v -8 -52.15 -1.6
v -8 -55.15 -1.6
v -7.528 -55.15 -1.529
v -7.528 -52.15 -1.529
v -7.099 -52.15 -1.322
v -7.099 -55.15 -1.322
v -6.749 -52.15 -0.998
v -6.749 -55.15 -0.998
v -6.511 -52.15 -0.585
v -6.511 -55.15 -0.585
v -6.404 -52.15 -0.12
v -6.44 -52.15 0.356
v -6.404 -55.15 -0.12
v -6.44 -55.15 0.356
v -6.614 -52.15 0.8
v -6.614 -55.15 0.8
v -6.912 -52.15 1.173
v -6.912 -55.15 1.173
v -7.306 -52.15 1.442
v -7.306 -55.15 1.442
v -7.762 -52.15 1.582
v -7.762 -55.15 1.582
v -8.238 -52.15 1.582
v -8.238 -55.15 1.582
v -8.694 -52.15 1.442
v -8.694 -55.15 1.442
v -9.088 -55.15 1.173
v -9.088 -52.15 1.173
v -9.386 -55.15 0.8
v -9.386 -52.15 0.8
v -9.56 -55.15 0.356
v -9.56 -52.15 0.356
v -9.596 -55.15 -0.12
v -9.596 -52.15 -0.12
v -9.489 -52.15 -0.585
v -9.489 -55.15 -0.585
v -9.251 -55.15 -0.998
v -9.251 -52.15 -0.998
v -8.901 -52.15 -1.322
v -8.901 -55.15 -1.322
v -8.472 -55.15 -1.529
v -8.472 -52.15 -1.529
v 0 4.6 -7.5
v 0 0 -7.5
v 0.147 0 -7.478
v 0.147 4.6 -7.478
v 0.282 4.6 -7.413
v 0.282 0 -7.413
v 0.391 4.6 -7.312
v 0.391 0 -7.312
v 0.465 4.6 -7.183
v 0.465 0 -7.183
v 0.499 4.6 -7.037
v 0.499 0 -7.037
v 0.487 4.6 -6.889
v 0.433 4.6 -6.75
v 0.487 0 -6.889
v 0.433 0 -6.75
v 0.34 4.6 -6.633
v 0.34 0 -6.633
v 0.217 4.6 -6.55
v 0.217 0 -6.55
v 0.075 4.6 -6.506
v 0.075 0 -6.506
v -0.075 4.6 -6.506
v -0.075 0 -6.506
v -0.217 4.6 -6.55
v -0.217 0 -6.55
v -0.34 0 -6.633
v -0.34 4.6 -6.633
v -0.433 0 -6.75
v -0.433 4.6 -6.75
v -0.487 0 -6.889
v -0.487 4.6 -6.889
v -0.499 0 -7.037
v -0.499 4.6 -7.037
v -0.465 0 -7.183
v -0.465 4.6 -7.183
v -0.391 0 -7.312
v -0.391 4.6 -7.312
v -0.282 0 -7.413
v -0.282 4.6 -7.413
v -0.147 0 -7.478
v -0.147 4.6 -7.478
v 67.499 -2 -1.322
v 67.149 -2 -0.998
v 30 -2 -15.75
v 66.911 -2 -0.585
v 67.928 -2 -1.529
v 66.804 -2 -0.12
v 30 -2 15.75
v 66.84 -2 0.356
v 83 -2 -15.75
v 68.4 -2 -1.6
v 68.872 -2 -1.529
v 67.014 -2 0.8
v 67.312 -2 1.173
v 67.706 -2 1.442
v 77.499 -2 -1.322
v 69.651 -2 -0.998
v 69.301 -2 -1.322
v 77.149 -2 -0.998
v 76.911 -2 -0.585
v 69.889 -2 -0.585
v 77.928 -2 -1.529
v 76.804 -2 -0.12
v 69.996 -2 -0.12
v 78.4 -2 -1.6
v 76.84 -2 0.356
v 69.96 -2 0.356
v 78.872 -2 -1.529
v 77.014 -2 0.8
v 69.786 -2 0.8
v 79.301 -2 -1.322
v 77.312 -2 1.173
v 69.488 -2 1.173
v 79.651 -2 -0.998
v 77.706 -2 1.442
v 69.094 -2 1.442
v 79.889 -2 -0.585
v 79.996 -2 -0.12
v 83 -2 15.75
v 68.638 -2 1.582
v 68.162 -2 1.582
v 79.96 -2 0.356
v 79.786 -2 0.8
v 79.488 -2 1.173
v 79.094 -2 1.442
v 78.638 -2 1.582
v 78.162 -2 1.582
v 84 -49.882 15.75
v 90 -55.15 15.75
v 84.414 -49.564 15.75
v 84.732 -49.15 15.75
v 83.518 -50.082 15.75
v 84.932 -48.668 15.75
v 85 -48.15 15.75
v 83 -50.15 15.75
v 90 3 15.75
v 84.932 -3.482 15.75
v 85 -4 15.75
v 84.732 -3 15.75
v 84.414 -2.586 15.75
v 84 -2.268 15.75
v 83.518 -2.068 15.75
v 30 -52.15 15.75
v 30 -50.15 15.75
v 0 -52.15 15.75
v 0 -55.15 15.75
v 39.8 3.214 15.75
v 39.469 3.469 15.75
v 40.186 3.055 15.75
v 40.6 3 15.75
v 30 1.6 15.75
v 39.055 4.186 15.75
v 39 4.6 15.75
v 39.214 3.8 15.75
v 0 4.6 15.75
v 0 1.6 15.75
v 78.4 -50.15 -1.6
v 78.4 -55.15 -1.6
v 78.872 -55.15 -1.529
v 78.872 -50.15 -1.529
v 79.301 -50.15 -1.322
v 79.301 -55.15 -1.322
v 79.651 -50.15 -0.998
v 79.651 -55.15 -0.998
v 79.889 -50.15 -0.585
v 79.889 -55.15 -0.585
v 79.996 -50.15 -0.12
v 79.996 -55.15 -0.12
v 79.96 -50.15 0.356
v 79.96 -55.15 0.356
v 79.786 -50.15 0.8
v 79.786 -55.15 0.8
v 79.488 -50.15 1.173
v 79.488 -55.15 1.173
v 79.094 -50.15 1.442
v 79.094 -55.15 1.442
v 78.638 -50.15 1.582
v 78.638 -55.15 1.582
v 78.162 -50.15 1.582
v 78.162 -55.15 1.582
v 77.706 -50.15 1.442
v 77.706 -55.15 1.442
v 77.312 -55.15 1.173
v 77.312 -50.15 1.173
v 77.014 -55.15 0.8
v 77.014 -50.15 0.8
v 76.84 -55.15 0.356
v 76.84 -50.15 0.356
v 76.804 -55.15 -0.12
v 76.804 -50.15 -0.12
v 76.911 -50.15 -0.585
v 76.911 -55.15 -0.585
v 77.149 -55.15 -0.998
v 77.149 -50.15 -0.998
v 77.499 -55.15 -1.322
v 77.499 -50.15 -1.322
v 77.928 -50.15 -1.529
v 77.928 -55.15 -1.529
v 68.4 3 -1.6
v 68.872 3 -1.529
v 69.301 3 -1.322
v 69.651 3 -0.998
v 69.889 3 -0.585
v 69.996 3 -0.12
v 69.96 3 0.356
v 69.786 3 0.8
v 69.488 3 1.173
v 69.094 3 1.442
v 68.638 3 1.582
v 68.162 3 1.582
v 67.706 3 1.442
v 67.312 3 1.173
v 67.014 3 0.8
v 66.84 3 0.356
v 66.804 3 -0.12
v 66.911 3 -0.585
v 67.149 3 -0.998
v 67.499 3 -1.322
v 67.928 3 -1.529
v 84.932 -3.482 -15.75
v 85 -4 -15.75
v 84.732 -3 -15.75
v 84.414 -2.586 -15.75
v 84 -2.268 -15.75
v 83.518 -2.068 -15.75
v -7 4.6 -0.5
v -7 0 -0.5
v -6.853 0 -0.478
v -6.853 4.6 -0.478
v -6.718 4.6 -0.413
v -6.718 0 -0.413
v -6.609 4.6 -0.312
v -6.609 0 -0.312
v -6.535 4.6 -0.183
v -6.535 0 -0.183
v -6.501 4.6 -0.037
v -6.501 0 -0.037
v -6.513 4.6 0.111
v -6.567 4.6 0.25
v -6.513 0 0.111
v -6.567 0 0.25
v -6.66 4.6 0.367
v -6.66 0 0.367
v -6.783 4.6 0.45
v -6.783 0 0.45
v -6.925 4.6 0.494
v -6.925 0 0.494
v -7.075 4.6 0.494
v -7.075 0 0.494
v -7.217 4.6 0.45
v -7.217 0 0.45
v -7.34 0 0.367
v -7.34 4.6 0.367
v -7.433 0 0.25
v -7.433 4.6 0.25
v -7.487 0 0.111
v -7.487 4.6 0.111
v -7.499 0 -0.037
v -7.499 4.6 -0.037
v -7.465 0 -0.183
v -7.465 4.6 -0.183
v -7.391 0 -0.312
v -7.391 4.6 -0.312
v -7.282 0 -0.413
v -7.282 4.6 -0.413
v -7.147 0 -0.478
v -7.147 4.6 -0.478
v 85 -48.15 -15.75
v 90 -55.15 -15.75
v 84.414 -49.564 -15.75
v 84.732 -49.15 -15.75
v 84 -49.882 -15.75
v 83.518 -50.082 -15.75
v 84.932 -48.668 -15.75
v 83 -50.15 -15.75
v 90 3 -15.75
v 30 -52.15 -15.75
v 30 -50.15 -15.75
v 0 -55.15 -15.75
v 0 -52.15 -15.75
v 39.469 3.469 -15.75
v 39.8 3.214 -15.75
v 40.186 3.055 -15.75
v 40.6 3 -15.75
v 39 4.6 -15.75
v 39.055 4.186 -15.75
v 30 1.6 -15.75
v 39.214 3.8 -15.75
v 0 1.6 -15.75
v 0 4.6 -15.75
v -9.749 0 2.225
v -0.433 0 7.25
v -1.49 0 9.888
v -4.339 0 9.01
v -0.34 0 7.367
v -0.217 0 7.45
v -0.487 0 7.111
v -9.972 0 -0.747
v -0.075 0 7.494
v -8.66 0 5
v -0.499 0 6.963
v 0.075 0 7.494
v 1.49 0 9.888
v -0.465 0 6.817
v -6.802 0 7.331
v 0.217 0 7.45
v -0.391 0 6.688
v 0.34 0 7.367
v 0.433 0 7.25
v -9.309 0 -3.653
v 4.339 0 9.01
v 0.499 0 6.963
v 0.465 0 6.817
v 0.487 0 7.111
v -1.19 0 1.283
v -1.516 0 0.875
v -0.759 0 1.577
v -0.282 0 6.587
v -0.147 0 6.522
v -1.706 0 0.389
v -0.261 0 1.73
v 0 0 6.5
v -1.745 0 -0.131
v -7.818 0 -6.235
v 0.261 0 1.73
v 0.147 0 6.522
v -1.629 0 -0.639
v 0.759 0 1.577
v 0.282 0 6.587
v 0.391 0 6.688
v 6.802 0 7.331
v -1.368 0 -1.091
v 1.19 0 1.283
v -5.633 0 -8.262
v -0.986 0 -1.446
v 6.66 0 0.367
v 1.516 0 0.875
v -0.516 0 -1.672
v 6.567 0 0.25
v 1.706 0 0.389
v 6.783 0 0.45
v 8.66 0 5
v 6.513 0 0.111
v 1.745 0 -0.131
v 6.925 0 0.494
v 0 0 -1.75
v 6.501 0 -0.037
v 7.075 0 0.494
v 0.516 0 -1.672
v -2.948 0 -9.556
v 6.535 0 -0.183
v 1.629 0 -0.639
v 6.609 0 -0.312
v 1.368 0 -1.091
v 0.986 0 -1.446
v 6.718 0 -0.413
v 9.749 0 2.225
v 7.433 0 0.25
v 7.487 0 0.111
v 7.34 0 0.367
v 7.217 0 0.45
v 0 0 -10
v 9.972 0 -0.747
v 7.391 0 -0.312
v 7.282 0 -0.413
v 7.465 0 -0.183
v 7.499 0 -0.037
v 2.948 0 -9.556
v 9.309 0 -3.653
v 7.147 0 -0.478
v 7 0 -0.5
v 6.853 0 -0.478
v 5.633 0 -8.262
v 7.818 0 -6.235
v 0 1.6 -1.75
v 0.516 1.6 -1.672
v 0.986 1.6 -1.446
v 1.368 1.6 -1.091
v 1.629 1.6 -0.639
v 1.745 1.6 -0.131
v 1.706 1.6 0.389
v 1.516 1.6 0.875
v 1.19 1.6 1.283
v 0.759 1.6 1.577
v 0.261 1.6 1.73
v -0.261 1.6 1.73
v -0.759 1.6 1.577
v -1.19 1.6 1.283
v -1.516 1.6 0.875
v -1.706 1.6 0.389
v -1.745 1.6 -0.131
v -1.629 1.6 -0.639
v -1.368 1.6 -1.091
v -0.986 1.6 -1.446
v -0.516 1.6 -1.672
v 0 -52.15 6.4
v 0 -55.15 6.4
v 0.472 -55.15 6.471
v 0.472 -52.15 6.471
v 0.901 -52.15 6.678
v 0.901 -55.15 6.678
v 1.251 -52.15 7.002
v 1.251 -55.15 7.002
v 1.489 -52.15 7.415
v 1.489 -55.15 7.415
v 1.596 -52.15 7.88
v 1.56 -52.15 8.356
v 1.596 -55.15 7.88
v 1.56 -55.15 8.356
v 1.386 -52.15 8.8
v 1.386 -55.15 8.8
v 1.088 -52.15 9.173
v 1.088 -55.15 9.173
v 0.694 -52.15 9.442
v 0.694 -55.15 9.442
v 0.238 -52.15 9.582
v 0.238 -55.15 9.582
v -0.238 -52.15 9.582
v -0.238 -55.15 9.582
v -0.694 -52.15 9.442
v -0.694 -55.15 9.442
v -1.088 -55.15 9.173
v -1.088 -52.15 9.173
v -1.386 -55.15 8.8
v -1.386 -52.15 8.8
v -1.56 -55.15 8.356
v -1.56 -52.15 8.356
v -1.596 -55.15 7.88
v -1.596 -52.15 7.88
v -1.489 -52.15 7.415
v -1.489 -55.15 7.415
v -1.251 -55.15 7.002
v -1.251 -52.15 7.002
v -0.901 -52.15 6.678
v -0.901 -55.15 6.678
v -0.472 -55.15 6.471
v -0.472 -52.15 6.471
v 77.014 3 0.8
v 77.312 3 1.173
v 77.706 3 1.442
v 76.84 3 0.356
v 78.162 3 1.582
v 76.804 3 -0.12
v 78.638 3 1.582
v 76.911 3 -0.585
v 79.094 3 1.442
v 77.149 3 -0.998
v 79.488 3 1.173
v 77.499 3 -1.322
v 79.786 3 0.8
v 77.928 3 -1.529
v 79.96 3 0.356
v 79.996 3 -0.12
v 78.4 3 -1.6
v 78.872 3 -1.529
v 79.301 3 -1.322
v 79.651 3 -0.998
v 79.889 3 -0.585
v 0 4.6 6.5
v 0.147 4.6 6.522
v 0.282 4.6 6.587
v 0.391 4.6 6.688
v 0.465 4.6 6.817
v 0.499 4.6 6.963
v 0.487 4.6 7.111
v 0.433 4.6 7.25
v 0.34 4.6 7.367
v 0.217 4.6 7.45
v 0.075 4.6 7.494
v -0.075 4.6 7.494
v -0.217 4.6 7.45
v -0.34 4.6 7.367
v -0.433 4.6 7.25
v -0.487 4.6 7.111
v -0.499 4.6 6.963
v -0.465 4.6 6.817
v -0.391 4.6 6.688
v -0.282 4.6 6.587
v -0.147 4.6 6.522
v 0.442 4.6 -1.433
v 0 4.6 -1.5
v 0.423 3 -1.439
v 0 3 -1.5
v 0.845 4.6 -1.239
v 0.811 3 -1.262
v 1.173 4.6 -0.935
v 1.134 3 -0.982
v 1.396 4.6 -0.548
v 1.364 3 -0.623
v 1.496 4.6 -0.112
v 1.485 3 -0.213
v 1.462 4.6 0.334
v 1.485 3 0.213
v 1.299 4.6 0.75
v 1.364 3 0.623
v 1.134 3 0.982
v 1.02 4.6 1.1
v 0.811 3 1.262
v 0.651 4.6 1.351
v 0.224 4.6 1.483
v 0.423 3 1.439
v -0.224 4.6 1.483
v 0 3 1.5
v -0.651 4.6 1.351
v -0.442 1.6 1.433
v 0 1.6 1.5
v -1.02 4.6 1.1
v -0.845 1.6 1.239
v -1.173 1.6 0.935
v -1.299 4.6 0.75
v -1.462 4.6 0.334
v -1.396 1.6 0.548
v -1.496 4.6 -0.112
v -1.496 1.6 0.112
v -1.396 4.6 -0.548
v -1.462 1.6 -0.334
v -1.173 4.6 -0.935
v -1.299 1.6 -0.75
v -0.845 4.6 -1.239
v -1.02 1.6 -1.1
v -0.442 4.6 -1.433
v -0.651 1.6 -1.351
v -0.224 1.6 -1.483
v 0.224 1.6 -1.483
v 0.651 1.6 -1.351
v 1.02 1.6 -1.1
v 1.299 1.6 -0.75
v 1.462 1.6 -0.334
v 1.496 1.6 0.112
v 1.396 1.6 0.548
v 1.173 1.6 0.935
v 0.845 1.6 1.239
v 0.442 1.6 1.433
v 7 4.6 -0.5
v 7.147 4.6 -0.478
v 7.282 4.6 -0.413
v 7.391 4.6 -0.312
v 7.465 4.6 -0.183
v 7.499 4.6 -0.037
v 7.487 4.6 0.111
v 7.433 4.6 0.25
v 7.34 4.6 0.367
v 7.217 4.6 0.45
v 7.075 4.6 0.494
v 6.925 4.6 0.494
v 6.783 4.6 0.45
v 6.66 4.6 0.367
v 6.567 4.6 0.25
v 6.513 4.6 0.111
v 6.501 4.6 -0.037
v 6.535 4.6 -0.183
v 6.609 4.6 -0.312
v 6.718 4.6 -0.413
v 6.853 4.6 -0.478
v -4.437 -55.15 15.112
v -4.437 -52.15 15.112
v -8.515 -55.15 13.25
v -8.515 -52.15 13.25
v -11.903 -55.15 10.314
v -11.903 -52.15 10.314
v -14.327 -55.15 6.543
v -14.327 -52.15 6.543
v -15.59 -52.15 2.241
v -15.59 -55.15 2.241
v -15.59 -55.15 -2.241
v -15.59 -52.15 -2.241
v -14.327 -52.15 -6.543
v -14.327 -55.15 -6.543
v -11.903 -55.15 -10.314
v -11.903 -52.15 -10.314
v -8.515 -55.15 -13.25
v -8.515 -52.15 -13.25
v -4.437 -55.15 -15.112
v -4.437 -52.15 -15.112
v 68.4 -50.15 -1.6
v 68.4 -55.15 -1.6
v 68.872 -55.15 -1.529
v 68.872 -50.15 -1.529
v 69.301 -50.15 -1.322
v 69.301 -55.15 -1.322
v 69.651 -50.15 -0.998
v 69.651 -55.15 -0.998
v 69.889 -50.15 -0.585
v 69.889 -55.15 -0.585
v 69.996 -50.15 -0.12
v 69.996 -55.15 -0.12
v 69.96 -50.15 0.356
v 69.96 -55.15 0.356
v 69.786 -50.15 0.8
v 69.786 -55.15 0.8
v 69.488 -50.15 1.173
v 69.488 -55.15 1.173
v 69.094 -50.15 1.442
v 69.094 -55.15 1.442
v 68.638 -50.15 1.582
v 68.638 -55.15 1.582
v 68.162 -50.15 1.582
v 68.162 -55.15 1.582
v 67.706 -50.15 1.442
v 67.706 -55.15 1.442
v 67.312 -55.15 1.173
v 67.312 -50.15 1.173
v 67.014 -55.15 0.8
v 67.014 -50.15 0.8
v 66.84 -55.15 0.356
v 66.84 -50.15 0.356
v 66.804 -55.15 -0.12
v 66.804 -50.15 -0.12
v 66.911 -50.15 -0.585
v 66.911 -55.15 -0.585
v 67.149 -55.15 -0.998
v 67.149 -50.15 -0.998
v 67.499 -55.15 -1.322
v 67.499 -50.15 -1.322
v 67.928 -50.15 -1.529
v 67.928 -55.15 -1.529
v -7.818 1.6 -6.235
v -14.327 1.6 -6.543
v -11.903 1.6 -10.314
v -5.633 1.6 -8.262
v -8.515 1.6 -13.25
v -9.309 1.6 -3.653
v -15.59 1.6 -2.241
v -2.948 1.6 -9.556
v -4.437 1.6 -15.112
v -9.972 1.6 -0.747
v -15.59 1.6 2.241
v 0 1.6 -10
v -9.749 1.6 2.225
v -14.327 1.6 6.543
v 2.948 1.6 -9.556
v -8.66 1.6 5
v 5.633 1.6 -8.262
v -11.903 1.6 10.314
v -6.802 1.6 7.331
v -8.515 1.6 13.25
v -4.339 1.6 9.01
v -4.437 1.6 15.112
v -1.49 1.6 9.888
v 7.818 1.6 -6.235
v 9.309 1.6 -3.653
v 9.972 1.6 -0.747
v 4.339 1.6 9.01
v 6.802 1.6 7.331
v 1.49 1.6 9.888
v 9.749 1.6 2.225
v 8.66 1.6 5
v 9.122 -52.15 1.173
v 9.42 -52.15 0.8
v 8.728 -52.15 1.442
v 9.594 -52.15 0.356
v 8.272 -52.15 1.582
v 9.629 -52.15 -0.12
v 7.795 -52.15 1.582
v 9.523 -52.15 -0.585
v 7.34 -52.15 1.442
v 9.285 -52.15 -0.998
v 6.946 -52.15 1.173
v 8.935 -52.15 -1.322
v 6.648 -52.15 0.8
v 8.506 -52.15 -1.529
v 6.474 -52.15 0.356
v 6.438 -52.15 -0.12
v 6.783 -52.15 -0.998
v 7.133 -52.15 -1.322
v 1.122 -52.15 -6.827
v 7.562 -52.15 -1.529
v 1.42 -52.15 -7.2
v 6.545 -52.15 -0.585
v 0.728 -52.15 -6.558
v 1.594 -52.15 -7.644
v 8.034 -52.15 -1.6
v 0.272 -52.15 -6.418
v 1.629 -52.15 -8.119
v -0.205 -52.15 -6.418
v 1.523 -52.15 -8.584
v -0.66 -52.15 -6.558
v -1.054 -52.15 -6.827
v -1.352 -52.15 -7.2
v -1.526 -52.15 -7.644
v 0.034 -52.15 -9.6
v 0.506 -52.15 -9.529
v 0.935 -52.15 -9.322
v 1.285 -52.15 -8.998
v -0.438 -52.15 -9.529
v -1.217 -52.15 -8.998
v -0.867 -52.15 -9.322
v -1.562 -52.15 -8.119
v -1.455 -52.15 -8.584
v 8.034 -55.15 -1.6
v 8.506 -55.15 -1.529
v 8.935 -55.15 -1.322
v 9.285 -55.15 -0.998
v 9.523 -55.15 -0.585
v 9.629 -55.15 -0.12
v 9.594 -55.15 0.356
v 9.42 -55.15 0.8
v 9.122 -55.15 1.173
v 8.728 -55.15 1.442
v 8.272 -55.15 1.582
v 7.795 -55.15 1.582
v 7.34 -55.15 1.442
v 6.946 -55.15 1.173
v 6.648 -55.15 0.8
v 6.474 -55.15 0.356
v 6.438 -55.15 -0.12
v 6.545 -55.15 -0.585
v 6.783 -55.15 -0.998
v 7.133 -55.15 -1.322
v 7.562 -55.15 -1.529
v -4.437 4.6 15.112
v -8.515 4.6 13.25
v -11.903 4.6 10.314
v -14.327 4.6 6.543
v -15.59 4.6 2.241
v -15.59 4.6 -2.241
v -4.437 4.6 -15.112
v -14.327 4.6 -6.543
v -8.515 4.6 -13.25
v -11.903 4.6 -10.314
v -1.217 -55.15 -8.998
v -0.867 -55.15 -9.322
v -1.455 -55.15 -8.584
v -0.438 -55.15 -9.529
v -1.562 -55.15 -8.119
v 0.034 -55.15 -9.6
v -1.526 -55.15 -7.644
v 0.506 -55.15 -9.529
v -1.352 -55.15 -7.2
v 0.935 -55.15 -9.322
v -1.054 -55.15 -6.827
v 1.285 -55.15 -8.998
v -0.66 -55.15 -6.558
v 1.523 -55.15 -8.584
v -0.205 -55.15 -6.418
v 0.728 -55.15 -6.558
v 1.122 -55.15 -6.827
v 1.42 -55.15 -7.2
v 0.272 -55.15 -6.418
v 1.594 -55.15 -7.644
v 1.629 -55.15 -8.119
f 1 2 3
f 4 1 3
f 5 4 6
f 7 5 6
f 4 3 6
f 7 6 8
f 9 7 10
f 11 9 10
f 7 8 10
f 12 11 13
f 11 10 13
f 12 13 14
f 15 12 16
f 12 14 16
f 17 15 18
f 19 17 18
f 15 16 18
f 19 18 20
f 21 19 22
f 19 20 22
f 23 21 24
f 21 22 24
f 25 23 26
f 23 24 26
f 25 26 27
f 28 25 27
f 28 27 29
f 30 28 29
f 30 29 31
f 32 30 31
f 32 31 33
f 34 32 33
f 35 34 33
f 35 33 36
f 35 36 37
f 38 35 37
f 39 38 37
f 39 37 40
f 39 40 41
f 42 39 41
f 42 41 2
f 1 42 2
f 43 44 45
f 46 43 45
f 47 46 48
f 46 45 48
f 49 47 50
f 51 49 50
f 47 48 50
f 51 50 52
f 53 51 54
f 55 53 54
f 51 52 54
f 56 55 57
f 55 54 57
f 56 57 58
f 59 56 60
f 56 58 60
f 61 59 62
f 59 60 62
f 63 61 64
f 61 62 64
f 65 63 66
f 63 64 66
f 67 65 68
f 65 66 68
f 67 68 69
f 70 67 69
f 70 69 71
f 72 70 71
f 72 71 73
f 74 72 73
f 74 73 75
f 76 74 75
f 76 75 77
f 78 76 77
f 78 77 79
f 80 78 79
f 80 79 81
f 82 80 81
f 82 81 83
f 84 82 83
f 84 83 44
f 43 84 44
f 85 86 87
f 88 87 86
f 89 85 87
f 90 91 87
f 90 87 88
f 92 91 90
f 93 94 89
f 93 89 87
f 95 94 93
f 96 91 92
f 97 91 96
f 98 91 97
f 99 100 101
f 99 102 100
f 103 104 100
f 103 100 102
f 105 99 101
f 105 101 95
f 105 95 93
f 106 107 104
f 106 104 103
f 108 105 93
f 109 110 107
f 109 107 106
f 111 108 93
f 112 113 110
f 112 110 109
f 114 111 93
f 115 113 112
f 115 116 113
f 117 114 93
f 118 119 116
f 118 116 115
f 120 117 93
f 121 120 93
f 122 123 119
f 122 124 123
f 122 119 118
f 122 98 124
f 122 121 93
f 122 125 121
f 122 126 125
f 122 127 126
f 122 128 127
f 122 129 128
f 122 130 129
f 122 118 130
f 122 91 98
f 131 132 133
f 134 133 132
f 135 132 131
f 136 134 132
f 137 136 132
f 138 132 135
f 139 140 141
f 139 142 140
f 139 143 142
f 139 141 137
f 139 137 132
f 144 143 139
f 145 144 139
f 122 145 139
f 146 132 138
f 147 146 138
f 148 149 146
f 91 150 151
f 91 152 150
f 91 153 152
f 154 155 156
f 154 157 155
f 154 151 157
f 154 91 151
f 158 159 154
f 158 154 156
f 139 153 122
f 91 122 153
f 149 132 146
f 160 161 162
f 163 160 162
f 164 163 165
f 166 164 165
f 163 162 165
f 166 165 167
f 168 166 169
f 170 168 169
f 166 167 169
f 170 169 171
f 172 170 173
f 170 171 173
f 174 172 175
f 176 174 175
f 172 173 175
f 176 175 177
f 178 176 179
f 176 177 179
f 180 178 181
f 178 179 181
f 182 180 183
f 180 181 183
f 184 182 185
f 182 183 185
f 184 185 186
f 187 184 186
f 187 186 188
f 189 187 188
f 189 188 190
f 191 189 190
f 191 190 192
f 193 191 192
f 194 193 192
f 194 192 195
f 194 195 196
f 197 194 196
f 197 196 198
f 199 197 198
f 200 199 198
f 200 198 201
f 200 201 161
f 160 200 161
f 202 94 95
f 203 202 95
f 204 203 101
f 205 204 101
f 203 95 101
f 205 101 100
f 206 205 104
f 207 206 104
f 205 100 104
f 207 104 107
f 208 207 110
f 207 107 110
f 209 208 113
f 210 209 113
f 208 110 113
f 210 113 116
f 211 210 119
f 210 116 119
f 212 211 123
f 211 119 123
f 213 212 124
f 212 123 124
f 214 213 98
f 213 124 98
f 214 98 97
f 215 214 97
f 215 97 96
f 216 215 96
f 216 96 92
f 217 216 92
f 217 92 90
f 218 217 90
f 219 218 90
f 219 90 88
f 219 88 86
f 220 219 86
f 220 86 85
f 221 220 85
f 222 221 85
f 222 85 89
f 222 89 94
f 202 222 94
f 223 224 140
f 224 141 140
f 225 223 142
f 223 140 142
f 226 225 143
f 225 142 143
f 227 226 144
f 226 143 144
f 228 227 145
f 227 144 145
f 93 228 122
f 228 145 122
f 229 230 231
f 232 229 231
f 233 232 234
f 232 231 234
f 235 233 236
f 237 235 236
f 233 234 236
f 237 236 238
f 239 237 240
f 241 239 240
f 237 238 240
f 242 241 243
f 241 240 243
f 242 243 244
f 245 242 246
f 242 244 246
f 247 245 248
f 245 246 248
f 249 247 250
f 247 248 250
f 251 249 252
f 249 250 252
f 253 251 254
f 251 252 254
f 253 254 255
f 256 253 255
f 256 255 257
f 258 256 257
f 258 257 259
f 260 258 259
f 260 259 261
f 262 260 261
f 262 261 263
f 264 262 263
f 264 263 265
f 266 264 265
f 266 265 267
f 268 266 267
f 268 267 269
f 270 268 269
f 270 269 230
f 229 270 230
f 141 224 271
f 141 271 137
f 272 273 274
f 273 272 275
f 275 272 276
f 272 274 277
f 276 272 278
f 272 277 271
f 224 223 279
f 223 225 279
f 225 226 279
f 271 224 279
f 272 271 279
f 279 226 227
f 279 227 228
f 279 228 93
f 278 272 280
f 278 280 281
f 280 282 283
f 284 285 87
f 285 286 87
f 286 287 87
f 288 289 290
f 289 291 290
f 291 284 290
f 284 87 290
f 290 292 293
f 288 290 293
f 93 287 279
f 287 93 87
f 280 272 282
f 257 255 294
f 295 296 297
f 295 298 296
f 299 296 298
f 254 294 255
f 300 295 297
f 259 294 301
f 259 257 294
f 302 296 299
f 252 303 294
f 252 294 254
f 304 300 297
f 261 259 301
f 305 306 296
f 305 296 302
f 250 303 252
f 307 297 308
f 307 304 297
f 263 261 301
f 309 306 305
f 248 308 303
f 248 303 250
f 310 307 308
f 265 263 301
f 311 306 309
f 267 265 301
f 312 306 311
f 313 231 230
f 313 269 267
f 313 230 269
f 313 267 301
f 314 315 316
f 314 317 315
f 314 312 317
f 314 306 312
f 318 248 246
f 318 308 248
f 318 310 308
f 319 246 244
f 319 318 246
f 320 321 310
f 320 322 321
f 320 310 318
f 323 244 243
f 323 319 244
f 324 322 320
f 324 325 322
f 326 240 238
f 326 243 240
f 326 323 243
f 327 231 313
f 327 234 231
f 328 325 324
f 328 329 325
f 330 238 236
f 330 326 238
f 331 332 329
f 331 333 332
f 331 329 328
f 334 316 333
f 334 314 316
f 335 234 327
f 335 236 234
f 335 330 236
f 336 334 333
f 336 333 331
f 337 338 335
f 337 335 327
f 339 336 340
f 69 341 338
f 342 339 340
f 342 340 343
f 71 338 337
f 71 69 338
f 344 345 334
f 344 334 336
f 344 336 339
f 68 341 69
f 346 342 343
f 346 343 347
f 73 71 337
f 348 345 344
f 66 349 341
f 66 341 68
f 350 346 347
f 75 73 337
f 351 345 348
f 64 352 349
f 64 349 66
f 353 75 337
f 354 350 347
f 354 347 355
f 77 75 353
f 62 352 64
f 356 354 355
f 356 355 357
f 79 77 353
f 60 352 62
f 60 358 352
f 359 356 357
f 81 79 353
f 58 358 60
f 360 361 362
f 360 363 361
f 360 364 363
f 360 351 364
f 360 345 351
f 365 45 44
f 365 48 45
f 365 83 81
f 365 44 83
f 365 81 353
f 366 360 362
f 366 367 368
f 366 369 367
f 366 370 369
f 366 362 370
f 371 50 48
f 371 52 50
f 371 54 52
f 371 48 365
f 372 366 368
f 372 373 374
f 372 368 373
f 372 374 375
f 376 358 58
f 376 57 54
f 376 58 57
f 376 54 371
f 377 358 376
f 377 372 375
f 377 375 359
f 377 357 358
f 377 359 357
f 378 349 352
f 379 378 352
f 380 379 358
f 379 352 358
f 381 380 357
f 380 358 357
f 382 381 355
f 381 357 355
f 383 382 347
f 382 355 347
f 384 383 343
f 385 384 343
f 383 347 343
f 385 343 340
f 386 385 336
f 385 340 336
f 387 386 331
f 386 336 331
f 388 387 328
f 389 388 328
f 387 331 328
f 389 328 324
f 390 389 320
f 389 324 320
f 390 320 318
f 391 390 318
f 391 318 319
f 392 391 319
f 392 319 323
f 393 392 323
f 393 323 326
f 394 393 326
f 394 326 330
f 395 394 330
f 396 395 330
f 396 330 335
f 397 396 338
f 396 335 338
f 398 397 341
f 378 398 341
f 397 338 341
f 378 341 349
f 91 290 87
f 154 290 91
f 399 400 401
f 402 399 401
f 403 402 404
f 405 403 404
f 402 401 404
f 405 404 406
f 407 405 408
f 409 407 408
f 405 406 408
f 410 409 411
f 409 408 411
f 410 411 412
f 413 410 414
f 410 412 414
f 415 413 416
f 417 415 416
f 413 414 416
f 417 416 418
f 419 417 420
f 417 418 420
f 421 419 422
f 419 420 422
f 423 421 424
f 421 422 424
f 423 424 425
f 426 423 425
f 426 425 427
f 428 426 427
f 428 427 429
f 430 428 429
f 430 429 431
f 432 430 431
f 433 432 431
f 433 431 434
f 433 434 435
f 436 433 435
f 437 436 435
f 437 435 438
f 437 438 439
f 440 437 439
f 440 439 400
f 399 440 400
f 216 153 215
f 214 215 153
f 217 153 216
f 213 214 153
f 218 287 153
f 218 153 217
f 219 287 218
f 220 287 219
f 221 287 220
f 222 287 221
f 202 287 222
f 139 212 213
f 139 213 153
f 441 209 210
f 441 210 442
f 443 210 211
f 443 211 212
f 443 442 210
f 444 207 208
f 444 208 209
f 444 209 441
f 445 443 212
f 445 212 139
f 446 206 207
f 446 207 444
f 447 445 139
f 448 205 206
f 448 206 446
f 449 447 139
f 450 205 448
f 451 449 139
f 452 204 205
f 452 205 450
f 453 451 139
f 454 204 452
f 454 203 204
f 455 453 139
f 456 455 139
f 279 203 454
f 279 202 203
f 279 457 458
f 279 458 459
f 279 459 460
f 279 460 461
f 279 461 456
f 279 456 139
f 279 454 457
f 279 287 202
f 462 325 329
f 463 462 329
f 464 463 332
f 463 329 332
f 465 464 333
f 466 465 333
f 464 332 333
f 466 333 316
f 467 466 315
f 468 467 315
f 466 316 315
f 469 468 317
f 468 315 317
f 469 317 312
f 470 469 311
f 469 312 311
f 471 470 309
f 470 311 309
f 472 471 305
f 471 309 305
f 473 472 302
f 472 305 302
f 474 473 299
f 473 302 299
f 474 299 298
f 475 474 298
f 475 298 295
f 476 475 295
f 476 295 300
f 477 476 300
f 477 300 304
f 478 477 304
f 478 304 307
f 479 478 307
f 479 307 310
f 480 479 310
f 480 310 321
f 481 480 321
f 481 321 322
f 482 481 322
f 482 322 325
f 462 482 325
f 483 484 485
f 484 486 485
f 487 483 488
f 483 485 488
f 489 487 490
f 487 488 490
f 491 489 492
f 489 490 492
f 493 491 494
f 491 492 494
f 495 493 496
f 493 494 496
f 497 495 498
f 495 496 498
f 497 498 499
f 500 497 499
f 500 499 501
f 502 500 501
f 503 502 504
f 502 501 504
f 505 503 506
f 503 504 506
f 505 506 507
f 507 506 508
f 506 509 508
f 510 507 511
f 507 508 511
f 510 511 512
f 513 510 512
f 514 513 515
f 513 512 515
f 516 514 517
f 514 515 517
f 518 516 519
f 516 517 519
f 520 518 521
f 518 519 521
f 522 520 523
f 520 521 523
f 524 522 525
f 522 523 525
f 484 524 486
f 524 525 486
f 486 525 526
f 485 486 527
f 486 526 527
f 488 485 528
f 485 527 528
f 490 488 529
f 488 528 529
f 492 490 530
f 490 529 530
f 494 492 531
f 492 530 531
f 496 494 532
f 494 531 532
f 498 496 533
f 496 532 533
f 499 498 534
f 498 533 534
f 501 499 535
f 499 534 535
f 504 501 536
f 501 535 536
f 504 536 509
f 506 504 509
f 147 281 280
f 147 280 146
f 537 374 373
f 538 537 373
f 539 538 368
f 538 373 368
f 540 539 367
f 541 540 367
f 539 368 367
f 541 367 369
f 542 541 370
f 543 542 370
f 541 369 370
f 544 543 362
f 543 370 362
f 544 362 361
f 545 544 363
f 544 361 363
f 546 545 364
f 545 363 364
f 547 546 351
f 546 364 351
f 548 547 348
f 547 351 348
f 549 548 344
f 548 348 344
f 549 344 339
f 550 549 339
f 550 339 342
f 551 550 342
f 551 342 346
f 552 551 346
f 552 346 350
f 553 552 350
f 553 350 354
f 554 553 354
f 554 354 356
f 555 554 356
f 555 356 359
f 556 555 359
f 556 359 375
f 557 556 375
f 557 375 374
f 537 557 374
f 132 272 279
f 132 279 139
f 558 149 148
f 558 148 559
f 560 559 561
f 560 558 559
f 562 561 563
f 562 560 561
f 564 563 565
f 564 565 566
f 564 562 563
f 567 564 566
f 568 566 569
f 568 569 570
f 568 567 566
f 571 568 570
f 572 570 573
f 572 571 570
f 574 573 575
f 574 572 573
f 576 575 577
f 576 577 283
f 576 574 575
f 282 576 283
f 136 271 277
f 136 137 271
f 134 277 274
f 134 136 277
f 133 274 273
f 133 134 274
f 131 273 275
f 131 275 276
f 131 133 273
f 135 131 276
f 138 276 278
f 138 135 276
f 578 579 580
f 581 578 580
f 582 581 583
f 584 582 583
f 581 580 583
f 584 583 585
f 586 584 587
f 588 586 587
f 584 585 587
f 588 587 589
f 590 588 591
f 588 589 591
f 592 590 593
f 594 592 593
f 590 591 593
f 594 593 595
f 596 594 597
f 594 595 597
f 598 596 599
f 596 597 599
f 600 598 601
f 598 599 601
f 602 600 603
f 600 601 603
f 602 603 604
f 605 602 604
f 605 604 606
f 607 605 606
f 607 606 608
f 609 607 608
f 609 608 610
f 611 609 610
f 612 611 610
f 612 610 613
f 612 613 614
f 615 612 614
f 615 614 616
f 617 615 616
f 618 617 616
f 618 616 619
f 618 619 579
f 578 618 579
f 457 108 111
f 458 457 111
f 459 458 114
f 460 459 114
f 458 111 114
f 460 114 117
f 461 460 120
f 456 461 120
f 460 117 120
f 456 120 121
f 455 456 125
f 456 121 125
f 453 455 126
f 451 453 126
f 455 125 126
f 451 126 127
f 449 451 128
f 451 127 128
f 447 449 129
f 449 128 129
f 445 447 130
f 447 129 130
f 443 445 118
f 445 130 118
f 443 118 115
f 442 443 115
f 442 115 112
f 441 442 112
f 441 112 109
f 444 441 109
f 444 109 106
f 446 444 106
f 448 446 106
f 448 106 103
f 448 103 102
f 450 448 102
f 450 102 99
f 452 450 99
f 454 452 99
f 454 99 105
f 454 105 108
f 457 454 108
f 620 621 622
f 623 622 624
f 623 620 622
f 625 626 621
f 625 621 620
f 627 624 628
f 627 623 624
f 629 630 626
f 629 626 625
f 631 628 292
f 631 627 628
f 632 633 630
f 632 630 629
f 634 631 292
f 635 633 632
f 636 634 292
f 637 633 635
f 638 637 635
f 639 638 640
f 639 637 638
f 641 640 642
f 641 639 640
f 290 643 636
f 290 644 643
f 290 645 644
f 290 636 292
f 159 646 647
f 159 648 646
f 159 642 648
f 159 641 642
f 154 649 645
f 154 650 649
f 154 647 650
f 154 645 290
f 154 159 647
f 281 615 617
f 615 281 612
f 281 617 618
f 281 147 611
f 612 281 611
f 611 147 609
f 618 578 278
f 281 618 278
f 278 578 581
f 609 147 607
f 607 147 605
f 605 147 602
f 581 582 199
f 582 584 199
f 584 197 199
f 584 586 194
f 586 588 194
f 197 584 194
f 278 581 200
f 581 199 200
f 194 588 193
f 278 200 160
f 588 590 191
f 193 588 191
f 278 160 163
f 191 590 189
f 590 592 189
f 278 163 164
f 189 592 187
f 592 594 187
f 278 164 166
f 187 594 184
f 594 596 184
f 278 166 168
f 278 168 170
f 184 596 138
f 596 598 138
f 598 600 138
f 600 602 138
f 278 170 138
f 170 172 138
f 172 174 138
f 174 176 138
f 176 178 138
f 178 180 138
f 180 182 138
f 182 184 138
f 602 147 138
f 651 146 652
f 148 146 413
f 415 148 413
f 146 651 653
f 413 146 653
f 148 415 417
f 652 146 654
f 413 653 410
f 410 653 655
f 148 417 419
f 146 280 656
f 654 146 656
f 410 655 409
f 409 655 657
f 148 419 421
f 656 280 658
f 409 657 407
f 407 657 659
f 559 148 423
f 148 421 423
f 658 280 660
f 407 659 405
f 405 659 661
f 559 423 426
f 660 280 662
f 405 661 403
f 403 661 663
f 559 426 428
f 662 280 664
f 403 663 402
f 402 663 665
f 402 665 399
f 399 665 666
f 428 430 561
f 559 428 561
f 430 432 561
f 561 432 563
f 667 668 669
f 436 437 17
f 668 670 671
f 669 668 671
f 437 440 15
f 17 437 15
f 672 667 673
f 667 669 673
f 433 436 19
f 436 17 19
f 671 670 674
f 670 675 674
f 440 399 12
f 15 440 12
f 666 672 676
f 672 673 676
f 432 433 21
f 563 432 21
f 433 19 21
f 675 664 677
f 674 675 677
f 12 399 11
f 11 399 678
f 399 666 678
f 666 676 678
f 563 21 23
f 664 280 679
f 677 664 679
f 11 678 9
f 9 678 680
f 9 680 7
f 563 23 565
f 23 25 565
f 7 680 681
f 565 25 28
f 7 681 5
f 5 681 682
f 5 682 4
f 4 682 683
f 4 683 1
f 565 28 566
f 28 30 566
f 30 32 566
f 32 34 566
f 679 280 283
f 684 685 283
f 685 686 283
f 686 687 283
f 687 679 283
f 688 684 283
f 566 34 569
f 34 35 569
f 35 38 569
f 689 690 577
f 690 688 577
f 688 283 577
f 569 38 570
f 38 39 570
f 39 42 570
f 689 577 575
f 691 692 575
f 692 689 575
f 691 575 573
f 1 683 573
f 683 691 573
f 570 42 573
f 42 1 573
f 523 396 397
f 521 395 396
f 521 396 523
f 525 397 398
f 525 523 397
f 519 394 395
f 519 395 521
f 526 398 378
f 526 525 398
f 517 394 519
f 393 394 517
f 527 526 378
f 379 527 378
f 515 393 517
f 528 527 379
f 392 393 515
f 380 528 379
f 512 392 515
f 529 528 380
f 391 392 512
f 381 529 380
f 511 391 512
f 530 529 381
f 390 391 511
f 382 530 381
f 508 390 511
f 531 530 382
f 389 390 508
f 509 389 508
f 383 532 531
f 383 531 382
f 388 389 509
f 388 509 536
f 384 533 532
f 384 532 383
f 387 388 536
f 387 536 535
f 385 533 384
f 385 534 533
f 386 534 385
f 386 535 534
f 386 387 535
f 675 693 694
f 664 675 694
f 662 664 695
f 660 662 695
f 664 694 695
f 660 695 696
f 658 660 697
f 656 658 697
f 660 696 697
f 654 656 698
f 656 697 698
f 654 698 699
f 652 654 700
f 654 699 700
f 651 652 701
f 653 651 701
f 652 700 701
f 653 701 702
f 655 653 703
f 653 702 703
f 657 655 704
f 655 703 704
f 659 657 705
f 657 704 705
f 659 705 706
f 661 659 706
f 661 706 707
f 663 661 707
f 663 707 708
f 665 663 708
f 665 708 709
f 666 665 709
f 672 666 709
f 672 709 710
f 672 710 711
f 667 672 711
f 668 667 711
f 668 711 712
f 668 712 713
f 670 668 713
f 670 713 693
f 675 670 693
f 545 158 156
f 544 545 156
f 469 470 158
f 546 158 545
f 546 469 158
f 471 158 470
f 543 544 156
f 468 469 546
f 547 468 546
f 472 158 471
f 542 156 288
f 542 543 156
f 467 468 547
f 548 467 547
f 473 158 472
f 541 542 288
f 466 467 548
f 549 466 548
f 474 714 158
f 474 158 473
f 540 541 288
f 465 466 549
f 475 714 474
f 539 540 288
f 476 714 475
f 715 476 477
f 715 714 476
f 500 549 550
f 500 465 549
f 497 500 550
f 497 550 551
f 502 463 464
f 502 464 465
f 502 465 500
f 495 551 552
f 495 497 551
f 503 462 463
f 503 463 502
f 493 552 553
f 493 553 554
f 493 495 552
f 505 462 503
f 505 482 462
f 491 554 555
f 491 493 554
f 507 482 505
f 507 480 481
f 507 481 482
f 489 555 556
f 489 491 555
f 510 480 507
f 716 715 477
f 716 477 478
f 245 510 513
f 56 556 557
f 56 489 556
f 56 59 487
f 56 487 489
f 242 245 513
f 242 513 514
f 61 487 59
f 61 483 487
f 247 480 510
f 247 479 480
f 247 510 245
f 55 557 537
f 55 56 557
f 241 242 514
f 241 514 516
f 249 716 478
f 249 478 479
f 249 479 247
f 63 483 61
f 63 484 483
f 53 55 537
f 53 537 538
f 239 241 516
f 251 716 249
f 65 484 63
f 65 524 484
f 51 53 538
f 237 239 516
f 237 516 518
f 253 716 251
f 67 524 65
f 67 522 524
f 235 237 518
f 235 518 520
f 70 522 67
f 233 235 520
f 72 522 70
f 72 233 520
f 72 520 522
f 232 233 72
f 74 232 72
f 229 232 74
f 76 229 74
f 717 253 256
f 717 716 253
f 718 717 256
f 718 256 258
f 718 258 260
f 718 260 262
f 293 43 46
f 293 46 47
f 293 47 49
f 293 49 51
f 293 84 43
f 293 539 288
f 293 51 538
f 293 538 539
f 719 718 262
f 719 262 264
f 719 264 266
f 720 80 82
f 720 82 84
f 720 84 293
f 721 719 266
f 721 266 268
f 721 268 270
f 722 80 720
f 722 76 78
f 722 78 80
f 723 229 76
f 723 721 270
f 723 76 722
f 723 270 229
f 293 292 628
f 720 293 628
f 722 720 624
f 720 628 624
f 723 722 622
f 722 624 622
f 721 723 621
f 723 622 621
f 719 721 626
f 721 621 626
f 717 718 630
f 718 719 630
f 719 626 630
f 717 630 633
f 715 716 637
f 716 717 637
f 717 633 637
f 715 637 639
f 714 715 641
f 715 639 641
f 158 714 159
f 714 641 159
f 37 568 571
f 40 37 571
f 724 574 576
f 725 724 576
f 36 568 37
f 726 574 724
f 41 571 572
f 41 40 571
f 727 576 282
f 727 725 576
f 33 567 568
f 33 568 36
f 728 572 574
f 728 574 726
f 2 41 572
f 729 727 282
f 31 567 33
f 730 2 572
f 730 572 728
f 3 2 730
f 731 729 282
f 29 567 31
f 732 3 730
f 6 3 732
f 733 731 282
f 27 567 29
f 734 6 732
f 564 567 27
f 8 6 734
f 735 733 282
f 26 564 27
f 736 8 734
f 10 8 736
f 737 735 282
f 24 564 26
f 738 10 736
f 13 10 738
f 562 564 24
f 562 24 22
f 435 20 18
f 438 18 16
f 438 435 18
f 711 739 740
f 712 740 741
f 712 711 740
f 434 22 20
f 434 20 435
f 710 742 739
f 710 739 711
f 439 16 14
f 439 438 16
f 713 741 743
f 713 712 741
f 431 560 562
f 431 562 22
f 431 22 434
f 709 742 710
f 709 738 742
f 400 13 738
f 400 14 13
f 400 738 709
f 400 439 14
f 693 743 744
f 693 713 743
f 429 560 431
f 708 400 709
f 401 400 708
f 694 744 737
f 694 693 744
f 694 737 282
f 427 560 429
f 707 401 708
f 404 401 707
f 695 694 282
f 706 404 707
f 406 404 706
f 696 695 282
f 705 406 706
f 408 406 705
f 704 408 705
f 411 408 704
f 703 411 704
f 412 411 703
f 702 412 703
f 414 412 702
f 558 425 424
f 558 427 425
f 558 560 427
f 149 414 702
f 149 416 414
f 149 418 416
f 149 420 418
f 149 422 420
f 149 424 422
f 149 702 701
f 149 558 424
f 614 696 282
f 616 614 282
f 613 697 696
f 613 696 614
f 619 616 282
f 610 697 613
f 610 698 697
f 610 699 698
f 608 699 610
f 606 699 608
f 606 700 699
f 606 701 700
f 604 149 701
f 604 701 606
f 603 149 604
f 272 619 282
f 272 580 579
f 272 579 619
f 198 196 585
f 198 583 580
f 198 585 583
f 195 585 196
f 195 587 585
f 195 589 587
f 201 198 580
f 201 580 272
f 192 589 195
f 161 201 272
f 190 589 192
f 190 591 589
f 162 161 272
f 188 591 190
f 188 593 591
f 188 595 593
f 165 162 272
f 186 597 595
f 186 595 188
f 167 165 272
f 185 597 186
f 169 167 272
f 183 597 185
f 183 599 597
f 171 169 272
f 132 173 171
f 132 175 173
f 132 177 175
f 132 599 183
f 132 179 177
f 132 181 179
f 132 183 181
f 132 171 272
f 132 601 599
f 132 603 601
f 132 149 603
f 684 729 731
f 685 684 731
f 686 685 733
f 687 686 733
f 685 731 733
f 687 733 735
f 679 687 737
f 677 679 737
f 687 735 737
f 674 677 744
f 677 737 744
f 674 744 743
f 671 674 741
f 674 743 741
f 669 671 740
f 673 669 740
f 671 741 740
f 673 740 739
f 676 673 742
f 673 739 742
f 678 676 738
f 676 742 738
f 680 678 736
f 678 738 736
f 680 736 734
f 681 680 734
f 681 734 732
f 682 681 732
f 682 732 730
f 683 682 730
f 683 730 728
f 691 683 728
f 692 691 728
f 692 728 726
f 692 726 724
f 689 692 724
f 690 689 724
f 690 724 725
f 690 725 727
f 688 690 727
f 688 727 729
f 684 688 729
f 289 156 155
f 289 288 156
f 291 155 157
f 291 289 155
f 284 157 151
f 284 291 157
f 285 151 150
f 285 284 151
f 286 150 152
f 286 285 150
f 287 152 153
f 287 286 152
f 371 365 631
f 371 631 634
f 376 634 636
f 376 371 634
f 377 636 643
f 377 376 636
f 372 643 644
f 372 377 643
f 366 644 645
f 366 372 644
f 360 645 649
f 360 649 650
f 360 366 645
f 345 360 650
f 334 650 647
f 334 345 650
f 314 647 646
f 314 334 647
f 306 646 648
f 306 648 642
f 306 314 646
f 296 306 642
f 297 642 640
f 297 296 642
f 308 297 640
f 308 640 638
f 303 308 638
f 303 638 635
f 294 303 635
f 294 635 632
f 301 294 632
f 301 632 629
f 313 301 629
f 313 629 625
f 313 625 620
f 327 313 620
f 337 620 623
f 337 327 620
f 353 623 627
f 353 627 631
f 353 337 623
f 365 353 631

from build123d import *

# Parameters (mm, degrees)
EXTRUDE_1_DEPTH     = 3
SKETCH_3_W          = 60
SKETCH_3_H          = 31.5
EXTRUDE_2_DEPTH     = 2
SKETCH_4_R          = 0.5
CUT_EXTRUDE_1_DEPTH = 10
SKETCH_5_R          = 1.5
CUT_EXTRUDE_2_DEPTH = 10
SKETCH_6_W          = 5
SKETCH_6_H          = 31.5
EXTRUDE_3_DEPTH     = 48.15
EXTRUDE_START       = 5
SKETCH_7_R          = 1.6
EXTRUDE_4_DEPTH     = 5
CUT_EXTRUDE_3_DEPTH = 2
FILLET_1_R          = 2
FILLET_2_R          = 2
CUT_EXTRUDE_5_DEPTH = 1.6
SKETCH_11_R         = 0.5
SKETCH_11_R_2       = 1.5
EXTRUDE_5_DEPTH     = 3
SKETCH_12_W         = 31.5
SKETCH_12_H         = 1.6
EXTRUDE_6_DEPTH     = 9
FILLET_4_R          = 1.6
EXTRUDE_START_2     = 1.6
SKETCH_13_R         = 10
SKETCH_13_R_2       = 1.75
SKETCH_13_R_3       = 0.5
EXTRUDE_7_DEPTH     = 1.6
SKETCH_14_R         = 1.6
CUT_EXTRUDE_6_DEPTH = 67.6


with BuildPart() as part:
    # 草图1 → 凸台-拉伸1 (new body)
    with BuildSketch(Plane(origin=(0, 0, 0), x_dir=(1, 0, 0), z_dir=(0, 1, 0))):
        with BuildLine():
            Line((0, -15.75), (90, -15.75))
            Line((90, -15.75), (90, 15.75))
            Line((90, 15.75), (0, 15.75))
            ThreePointArc((0, 15.75), (-15.75, 0), (0, -15.75))
        make_face()
    extrude(amount=EXTRUDE_1_DEPTH)

    # 草图3 → 凸台-拉伸2 (add)
    with BuildSketch(Plane.XZ):
        with Locations((60, 0)):
            Rectangle(SKETCH_3_W, SKETCH_3_H)
    extrude(amount=EXTRUDE_2_DEPTH)

    # 草图4 → 切除-拉伸1 (cut)
    with BuildSketch(Plane.XZ):
        with Locations(Location((0, 7, 0), (0, 0, 270))):
            Circle(SKETCH_4_R)
        with Locations(Location((7, 0, 0), (0, 0, 270))):
            Circle(SKETCH_4_R)
        with Locations(Location((0, -7, 0), (0, 0, 270))):
            Circle(SKETCH_4_R)
        with Locations(Location((-7, 0, 0), (0, 0, 270))):
            Circle(SKETCH_4_R)
    extrude(amount=-CUT_EXTRUDE_1_DEPTH, mode=Mode.SUBTRACT)

    # 草图5 → 切除-拉伸2 (cut)
    with BuildSketch(Plane(origin=(0, 3, 0), x_dir=(1, 0, 0), z_dir=(0, 1, 0))):
        with Locations(Location((0, 0, 0), (0, 0, 270))):
            Circle(SKETCH_5_R)
    extrude(amount=-CUT_EXTRUDE_2_DEPTH, mode=Mode.SUBTRACT)

    # 草图6 → 凸台-拉伸3 (add)
    with BuildSketch(Plane.XZ.offset(2)):
        with Locations((87.5, 0)):
            Rectangle(SKETCH_6_W, SKETCH_6_H)
    extrude(amount=EXTRUDE_3_DEPTH)

    # 草图7 → 凸台-拉伸4 (add)
    with BuildSketch(Plane.XZ.offset(50.15).offset(EXTRUDE_START)):
        with BuildLine():
            Line((90, 15.75), (0, 15.75))
            ThreePointArc((0, 15.75), (-15.75, 0), (0, -15.75))
            Line((0, -15.75), (90, -15.75))
            Line((90, -15.75), (90, 15.75))
        make_face()
        with Locations(Location((8.03393099, 0, 0), (0, 0, 270))):
            Circle(SKETCH_7_R, mode=Mode.SUBTRACT)
        with Locations(Location((0, 8, 0), (0, 0, 270))):
            Circle(SKETCH_7_R, mode=Mode.SUBTRACT)
        with Locations(Location((0.03393099, -7.999928043, 0), (0, 0, 270))):
            Circle(SKETCH_7_R, mode=Mode.SUBTRACT)
        with Locations(Location((-8, 0, 0), (0, 0, 270))):
            Circle(SKETCH_7_R, mode=Mode.SUBTRACT)
    extrude(amount=-EXTRUDE_4_DEPTH)

    # 草图8 → 切除-拉伸3 (cut)
    with BuildSketch(Plane(origin=(0, -50.15, 0), x_dir=(1, 0, 0), z_dir=(0, 1, 0))):
        Polygon((0, 15.75), (30, 15.75), (30, -15.75), (0, -15.75), (-20, -15.75), (-20, 15.75), align=None)
    extrude(amount=-CUT_EXTRUDE_3_DEPTH, mode=Mode.SUBTRACT)

    # 圆角1
    fillet_1_edges = [part.edges().sort_by_distance(p)[0] for p in [
        (85, -2, 0),
    ]]
    fillet(fillet_1_edges, radius=FILLET_1_R)

    # 圆角2
    fillet_2_edges = [part.edges().sort_by_distance(p)[0] for p in [
        (85, -50.15, 0),
    ]]
    fillet(fillet_2_edges, radius=FILLET_2_R)

    # 草图10 → 切除-拉伸5 (cut)
    with BuildSketch(Plane.XZ):
        with BuildLine():
            Line((30, -15.75), (30, 15.75))
            Line((30, 15.75), (0, 15.75))
            ThreePointArc((0, 15.75), (-15.75, 0), (0, -15.75))
            Line((0, -15.75), (30, -15.75))
        make_face()
    extrude(amount=-CUT_EXTRUDE_5_DEPTH, mode=Mode.SUBTRACT)

    # 草图11 → 凸台-拉伸5 (add)
    with BuildSketch(Plane.XZ.offset(-1.6)):
        with BuildLine():
            Line((0, -15.75), (30, -15.75))
            Line((30, -15.75), (30, 15.75))
            Line((30, 15.75), (0, 15.75))
            ThreePointArc((0, 15.75), (-15.75, 0), (0, -15.75))
        make_face()
        with Locations(Location((0, -7, 0), (0, 0, 270))):
            Circle(SKETCH_11_R, mode=Mode.SUBTRACT)
        with Locations(Location((-7, 0, 0), (0, 0, 270))):
            Circle(SKETCH_11_R, mode=Mode.SUBTRACT)
        with Locations(Location((0, 0, 0), (0, 0, 270))):
            Circle(SKETCH_11_R_2, mode=Mode.SUBTRACT)
        with Locations(Location((0, 7, 0), (0, 0, 270))):
            Circle(SKETCH_11_R, mode=Mode.SUBTRACT)
        with Locations(Location((7, 0, 0), (0, 0, 270))):
            Circle(SKETCH_11_R, mode=Mode.SUBTRACT)
    extrude(amount=-EXTRUDE_5_DEPTH)

    # 草图12 → 凸台-拉伸6 (add)
    with BuildSketch(Plane(origin=(30, 0, 0), x_dir=(0, 0, -1), z_dir=(1, 0, 0))):
        with Locations((0, 3.8)):
            Rectangle(SKETCH_12_W, SKETCH_12_H)
    extrude(amount=EXTRUDE_6_DEPTH)

    # 圆角4
    fillet_4_edges = [part.edges().sort_by_distance(p)[0] for p in [
        (39, 3, 0),
    ]]
    fillet(fillet_4_edges, radius=FILLET_4_R - 0.0001)  # a hair under: the kernel refuses the full size

    # 草图13 → 凸台-拉伸7 (add)
    with BuildSketch(Plane.XZ.offset(-1.6).offset(EXTRUDE_START_2)):
        with Locations(Location((0, 0, 0), (0, 0, 270))):
            Circle(SKETCH_13_R)
        with Locations(Location((0, 0, 0), (0, 0, 270))):
            Circle(SKETCH_13_R_2, mode=Mode.SUBTRACT)
        with Locations(Location((7, 0, 0), (0, 0, 270))):
            Circle(SKETCH_13_R_3, mode=Mode.SUBTRACT)
        with Locations(Location((0, -7, 0), (0, 0, 270))):
            Circle(SKETCH_13_R_3, mode=Mode.SUBTRACT)
        with Locations(Location((-7, 0, 0), (0, 0, 270))):
            Circle(SKETCH_13_R_3, mode=Mode.SUBTRACT)
        with Locations(Location((0, 7, 0), (0, 0, 270))):
            Circle(SKETCH_13_R_3, mode=Mode.SUBTRACT)
    extrude(amount=-EXTRUDE_7_DEPTH)

    # 草图14 → 切除-拉伸6 (cut)
    with BuildSketch(Plane.XZ.offset(55.15)):
        with Locations(Location((68.4, 0, 0), (0, 0, 270))):
            Circle(SKETCH_14_R)
        with Locations(Location((78.4, 0, 0), (0, 0, 270))):
            Circle(SKETCH_14_R)
    extrude(amount=-CUT_EXTRUDE_6_DEPTH, mode=Mode.SUBTRACT)


solid = part.part
